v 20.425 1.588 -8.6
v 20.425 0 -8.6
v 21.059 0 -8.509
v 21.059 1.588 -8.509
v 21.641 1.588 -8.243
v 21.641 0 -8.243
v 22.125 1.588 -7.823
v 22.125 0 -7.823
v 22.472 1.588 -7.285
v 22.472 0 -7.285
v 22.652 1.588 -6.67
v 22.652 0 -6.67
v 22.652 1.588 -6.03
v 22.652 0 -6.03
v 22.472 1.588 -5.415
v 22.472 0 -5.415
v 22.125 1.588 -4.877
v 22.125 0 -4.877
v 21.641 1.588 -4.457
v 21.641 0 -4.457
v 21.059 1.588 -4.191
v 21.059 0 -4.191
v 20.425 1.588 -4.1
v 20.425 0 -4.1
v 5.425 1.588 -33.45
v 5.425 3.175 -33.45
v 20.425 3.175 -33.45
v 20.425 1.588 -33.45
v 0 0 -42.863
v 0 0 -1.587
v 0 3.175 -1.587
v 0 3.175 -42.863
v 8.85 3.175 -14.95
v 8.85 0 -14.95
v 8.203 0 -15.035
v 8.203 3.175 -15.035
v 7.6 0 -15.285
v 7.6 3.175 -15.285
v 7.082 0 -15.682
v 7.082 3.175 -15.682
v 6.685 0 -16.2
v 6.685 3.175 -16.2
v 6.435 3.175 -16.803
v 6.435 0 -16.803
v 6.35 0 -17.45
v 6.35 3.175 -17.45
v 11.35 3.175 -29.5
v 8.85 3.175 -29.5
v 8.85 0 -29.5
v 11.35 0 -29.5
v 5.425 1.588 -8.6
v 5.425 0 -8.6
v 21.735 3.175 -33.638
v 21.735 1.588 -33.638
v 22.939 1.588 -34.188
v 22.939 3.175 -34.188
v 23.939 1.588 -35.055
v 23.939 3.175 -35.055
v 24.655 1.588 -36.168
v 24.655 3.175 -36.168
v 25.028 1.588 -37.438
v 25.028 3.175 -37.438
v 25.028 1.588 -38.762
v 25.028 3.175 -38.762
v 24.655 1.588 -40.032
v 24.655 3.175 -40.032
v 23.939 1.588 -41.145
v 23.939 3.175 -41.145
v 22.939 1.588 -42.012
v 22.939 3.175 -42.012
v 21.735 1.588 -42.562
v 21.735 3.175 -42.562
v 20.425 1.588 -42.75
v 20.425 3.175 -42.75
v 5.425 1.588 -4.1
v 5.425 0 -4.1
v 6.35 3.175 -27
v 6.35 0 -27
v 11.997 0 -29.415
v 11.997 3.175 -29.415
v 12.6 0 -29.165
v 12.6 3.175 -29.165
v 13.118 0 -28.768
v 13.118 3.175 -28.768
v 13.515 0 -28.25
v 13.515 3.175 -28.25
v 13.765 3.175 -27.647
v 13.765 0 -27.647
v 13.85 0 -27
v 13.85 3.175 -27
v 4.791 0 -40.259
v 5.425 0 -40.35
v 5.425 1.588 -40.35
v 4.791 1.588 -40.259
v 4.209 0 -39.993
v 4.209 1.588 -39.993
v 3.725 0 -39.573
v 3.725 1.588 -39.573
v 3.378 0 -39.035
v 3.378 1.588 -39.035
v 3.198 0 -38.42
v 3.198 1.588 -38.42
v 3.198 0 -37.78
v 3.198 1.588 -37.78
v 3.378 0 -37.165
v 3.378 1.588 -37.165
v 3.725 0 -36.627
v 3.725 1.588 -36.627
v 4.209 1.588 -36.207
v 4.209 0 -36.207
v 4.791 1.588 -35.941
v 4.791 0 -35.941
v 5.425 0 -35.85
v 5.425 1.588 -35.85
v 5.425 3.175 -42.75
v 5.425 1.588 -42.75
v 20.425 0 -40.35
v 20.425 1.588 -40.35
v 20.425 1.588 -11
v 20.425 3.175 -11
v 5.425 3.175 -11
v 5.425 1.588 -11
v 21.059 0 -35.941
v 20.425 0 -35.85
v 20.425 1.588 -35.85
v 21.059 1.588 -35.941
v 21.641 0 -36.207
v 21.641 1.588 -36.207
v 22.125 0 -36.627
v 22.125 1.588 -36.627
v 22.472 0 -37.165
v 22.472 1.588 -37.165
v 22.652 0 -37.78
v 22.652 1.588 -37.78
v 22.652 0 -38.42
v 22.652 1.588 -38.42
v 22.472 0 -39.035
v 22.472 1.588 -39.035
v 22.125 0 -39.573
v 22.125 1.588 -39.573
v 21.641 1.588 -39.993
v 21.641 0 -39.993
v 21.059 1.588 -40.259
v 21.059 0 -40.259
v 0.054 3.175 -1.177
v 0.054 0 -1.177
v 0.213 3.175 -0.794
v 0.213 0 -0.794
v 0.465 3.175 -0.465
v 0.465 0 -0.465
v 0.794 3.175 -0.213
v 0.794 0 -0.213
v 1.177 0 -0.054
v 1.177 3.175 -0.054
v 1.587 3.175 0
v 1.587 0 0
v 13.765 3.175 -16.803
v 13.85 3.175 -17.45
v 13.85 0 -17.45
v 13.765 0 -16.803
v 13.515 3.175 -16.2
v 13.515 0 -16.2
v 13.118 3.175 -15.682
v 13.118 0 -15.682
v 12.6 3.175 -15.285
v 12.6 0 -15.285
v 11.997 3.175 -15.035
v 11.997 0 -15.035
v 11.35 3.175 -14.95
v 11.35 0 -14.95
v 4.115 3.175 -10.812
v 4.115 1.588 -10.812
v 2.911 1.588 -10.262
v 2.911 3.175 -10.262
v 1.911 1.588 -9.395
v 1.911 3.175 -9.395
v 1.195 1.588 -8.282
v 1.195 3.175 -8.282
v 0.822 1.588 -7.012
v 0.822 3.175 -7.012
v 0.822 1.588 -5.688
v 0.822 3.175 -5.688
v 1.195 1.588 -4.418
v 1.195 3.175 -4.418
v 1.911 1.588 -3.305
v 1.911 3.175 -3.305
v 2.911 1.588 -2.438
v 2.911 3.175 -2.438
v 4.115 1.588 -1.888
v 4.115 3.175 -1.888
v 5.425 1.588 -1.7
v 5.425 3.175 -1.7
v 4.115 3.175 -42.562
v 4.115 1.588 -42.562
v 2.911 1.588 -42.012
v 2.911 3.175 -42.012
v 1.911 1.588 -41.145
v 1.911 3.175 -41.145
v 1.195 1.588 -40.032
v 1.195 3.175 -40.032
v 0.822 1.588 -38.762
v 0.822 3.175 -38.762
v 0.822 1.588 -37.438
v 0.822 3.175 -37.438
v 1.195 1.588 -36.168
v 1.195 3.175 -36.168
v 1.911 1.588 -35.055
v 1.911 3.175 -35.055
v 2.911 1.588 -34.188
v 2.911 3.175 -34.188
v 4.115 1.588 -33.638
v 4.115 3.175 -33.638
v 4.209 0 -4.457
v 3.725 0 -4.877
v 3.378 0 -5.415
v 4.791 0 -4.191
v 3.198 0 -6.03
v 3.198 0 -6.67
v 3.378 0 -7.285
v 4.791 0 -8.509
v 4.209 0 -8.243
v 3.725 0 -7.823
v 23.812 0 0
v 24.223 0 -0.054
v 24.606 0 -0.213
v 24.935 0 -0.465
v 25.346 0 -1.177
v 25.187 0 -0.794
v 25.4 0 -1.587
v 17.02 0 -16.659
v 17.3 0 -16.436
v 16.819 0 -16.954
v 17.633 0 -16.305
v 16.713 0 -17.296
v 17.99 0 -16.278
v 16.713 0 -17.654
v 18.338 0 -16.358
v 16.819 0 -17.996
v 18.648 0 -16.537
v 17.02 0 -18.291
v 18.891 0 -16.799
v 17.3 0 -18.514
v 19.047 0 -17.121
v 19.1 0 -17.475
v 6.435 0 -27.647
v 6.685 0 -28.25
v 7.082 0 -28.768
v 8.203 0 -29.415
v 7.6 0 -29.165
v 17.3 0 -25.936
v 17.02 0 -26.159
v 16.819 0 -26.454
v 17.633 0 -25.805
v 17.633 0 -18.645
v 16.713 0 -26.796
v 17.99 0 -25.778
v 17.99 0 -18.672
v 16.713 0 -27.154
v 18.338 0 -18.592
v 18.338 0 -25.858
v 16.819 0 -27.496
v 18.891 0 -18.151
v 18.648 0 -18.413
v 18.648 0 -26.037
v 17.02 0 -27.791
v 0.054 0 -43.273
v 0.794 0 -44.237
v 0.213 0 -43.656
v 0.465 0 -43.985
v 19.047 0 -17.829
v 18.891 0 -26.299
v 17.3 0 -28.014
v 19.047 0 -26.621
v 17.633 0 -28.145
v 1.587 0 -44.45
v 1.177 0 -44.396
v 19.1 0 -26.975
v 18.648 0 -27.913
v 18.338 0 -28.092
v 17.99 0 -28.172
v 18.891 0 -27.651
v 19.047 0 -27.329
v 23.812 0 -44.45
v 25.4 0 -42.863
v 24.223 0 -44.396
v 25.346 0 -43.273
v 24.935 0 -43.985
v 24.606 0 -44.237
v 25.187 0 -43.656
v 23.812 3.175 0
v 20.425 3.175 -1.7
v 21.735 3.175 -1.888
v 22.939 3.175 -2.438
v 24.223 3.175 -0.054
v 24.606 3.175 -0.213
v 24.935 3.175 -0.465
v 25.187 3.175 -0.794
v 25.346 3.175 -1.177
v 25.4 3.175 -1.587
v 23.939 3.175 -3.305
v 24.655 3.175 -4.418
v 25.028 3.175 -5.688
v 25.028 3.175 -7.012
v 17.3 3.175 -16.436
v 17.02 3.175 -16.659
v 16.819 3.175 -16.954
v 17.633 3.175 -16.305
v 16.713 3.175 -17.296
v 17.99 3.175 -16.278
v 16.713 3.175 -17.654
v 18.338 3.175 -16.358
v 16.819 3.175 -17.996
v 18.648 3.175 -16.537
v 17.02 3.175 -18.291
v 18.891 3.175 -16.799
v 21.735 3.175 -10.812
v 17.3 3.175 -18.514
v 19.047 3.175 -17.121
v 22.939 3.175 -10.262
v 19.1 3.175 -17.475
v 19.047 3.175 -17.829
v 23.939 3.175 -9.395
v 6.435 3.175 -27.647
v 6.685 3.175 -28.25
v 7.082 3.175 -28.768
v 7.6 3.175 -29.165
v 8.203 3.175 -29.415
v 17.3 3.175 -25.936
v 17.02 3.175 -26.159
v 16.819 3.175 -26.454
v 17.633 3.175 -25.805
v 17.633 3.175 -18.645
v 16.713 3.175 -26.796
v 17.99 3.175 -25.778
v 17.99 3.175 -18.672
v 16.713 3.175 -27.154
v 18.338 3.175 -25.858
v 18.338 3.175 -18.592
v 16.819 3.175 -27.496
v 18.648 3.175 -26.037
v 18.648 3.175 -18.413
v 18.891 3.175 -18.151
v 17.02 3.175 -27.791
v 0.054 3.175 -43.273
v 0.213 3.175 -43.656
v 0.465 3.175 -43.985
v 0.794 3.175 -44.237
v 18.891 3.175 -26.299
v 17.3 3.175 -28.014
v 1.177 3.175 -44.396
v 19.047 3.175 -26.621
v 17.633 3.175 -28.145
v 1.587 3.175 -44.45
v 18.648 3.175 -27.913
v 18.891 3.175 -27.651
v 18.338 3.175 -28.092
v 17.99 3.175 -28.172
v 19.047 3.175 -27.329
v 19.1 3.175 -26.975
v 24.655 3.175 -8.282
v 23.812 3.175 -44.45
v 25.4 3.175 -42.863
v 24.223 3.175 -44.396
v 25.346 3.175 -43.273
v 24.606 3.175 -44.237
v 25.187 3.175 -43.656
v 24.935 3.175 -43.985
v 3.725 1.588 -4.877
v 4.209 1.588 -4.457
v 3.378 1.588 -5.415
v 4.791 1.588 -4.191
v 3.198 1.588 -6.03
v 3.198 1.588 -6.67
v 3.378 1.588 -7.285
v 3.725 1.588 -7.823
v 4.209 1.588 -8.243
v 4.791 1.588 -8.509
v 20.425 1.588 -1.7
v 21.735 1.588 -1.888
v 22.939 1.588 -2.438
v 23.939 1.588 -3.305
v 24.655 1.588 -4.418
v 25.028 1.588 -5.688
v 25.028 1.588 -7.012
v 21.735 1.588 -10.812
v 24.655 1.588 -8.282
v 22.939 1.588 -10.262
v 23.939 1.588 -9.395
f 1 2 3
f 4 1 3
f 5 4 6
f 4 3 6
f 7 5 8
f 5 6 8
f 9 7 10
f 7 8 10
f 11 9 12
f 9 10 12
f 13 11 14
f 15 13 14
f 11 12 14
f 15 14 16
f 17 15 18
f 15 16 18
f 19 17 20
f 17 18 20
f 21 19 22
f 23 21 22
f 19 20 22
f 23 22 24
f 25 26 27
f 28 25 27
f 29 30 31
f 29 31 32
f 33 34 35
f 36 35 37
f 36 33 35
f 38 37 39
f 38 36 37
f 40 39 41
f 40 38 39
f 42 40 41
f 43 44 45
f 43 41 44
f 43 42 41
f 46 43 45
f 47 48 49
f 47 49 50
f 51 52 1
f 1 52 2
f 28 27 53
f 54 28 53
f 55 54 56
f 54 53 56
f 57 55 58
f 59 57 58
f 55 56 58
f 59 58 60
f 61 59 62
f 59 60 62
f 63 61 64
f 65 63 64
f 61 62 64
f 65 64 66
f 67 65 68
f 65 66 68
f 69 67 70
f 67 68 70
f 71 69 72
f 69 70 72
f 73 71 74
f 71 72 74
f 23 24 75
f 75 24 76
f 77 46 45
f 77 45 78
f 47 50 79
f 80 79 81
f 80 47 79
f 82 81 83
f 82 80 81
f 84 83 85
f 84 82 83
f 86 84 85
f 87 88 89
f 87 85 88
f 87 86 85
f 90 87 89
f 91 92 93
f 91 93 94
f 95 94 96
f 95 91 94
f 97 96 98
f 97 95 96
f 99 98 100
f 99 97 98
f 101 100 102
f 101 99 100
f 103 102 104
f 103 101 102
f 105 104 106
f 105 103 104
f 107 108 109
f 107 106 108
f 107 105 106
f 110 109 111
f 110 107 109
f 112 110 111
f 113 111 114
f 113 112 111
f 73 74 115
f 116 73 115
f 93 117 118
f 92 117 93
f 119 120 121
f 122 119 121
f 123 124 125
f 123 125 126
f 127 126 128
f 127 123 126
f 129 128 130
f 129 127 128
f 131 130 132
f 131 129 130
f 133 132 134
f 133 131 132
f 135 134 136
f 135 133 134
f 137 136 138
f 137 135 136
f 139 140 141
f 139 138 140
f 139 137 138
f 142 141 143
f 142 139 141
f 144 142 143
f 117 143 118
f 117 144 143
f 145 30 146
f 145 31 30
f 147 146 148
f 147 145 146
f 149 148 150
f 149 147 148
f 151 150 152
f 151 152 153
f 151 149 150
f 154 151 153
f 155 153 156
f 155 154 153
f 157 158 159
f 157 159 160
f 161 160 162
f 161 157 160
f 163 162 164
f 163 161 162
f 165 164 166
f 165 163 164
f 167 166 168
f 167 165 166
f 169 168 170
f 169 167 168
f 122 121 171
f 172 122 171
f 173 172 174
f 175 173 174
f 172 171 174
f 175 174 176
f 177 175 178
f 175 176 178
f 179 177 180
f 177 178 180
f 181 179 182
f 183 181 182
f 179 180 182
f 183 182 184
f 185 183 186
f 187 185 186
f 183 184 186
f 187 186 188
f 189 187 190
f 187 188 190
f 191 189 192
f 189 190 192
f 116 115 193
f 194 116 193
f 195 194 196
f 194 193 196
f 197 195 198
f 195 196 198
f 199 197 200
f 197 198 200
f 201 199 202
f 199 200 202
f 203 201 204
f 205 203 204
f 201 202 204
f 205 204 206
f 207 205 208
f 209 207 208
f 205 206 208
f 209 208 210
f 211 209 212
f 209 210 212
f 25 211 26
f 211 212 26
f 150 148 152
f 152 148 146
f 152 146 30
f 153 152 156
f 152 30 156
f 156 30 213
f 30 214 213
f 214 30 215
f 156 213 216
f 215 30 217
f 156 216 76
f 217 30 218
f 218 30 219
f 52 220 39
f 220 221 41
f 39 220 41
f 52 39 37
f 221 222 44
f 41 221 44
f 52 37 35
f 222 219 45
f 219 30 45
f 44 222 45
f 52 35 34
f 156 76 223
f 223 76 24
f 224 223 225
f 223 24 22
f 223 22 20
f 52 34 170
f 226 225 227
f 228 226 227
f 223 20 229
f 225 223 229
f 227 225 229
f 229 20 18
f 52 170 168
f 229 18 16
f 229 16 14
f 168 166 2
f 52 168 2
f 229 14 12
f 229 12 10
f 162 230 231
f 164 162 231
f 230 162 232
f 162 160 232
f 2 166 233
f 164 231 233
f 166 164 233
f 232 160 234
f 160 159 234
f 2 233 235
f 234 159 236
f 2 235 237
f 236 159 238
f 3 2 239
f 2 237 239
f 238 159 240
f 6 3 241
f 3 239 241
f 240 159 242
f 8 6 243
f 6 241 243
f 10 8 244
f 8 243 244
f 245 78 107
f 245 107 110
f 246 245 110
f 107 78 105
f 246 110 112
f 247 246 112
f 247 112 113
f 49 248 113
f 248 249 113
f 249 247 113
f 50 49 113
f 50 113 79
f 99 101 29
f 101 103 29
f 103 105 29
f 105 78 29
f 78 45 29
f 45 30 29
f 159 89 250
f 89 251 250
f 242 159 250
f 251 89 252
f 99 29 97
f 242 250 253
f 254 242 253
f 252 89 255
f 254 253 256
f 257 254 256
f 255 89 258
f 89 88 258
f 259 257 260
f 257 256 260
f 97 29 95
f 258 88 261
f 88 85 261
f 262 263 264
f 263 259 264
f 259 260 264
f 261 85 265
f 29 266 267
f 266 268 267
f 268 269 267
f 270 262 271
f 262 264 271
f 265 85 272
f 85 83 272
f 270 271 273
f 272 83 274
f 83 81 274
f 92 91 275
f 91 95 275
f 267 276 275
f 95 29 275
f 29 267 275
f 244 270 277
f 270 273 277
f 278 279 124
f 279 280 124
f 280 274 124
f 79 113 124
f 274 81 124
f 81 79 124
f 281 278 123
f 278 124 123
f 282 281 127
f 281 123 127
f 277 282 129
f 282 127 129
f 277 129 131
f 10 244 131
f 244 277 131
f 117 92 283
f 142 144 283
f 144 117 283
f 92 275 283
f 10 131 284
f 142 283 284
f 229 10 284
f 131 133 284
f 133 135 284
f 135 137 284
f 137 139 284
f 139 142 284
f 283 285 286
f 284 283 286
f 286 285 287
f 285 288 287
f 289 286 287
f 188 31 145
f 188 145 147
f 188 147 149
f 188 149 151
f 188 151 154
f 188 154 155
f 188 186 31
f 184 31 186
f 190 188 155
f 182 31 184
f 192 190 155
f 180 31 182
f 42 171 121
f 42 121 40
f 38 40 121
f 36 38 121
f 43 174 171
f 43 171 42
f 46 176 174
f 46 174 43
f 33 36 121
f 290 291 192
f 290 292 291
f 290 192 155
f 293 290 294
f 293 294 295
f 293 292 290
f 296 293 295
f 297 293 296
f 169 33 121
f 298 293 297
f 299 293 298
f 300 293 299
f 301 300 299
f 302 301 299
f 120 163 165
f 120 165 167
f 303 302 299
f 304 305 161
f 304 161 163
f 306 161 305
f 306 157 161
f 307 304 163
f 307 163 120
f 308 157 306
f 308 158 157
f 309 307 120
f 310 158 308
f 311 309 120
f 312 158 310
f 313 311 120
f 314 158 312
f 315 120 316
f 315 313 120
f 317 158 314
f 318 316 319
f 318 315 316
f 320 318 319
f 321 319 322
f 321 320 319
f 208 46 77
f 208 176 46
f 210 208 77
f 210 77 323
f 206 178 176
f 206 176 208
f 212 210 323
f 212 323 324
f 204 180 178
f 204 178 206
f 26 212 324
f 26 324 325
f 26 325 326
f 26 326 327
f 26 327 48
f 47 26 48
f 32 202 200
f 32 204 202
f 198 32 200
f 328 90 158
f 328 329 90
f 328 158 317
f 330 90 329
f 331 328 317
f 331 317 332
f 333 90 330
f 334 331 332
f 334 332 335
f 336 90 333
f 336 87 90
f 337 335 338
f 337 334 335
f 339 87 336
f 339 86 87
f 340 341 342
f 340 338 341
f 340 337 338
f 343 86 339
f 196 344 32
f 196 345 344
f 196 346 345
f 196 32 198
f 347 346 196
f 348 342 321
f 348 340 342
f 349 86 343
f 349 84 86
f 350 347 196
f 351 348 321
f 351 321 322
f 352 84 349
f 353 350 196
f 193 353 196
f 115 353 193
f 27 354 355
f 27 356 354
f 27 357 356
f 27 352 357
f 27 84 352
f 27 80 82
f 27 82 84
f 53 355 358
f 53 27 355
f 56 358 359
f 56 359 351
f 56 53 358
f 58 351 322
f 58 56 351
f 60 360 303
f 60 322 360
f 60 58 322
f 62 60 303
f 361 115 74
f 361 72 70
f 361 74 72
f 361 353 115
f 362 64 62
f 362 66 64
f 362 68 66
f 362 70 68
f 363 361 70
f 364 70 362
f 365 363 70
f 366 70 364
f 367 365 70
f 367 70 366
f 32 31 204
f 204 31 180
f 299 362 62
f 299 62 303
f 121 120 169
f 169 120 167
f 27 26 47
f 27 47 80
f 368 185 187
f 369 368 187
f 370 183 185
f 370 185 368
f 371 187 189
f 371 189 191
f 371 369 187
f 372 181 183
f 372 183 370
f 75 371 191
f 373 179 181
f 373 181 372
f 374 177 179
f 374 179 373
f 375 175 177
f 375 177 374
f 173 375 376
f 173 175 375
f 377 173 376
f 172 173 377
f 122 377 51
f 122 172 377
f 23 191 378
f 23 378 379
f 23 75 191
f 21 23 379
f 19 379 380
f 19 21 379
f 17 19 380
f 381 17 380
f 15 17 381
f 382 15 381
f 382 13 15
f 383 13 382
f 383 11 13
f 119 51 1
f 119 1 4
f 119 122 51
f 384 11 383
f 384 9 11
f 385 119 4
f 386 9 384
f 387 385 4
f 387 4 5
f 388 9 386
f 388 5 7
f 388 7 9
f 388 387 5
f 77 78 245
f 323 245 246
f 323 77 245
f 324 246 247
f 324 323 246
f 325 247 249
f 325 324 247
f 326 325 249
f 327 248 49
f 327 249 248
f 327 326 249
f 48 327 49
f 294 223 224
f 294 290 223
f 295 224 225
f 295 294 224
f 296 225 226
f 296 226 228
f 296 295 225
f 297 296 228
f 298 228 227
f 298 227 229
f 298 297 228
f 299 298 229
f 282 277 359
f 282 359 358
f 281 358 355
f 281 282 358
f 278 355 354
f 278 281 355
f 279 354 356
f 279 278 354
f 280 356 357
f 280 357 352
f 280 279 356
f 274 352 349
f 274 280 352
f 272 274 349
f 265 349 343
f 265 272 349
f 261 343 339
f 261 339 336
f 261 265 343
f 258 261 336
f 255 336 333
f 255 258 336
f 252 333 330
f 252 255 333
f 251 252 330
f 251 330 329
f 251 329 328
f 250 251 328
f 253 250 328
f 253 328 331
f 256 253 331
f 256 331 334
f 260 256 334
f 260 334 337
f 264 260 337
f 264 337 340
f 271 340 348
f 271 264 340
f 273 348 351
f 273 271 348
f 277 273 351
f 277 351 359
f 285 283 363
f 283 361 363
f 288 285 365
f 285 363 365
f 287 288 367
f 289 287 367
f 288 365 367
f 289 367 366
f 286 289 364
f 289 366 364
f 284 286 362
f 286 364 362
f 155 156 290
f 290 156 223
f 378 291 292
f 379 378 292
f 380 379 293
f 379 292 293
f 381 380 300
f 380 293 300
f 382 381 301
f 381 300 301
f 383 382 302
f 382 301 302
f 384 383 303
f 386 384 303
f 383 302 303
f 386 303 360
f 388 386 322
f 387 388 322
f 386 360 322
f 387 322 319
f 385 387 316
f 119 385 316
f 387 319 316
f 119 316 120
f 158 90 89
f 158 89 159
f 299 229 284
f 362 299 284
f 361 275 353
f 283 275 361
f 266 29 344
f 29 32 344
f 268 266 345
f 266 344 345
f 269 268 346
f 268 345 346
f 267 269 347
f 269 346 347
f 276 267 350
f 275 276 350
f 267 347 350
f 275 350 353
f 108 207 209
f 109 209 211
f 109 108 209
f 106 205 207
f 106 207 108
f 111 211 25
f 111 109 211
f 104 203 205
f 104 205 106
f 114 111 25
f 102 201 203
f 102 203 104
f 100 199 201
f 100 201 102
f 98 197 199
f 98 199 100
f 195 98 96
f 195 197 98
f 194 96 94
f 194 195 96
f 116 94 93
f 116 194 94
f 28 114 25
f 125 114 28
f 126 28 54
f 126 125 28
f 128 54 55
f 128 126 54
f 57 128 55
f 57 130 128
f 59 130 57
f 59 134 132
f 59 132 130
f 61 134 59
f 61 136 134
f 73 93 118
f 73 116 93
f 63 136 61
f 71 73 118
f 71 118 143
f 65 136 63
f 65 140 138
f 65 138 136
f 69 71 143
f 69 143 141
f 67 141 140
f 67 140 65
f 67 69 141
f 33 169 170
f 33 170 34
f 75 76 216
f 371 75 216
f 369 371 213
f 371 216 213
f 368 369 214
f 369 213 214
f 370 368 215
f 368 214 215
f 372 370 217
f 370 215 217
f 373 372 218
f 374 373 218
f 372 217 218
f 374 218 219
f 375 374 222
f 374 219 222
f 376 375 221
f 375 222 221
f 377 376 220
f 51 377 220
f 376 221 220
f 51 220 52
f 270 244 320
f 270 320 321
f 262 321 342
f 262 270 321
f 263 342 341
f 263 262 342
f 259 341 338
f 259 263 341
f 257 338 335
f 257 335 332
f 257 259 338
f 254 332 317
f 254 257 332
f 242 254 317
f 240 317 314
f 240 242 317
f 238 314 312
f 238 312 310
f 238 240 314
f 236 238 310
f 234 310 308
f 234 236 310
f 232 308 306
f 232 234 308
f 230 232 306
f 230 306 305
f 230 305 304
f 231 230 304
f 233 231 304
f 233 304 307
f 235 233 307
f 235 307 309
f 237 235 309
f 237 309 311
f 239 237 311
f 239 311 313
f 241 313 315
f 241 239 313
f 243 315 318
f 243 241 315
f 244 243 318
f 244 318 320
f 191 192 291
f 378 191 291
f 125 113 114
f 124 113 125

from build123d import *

# Parameters (mm, degrees)
SKETCH1_W           = 25.4
SKETCH1_H           = 44.45
SKETCH1_R           = 1.2
BOSS_EXTRUDE1_DEPTH = 3.175
CUT_EXTRUDE1_DEPTH  = 4.175
FILLET1_R           = 1.5875
CUT_EXTRUDE2_DEPTH  = 1.5875


with BuildPart() as part:
    # Sketch1 → Boss-Extrude1 (new body)
    with BuildSketch(Plane(origin=(0, 0, 0), x_dir=(1, 0, 0), z_dir=(0, 1, 0))):
        with Locations((12.7, 22.225)):
            Rectangle(SKETCH1_W, SKETCH1_H)
        with Locations((17.9, 17.475)):
            Circle(SKETCH1_R, mode=Mode.SUBTRACT)
        with Locations((17.9, 26.975)):
            Circle(SKETCH1_R, mode=Mode.SUBTRACT)
        with BuildLine():
            Line((5.425, 8.6), (20.425, 8.6))
            ThreePointArc((20.425, 8.6), (22.675, 6.35), (20.425, 4.1))
            Line((20.425, 4.1), (5.425, 4.1))
            ThreePointArc((5.425, 4.1), (3.175, 6.35), (5.425, 8.6))
        make_face(mode=Mode.SUBTRACT)
        with BuildLine():
            Line((5.425, 35.85), (20.425, 35.85))
            ThreePointArc((20.425, 35.85), (22.675, 38.1), (20.425, 40.35))
            Line((20.425, 40.35), (5.425, 40.35))
            ThreePointArc((5.425, 40.35), (3.175, 38.1), (5.425, 35.85))
        make_face(mode=Mode.SUBTRACT)
    extrude(amount=BOSS_EXTRUDE1_DEPTH)

    # Sketch2 → Cut-Extrude1 (cut, through all)
    with BuildSketch(Plane(origin=(0, 3.175, 0), x_dir=(1, 0, 0), z_dir=(0, 1, 0))):
        with BuildLine():
            Line((11.35, 14.95), (8.85, 14.95))
            ThreePointArc((8.85, 14.95), (7.082233047, 15.682233047), (6.35, 17.45))
            Line((6.35, 17.45), (6.35, 27))
            ThreePointArc((6.35, 27), (7.082233047, 28.767766953), (8.85, 29.5))
            Line((8.85, 29.5), (11.35, 29.5))
            ThreePointArc((11.35, 29.5), (13.117766953, 28.767766953), (13.85, 27))
            Line((13.85, 27), (13.85, 17.45))
            ThreePointArc((13.85, 17.45), (13.117766953, 15.682233047), (11.35, 14.95))
        make_face()
    extrude(amount=-CUT_EXTRUDE1_DEPTH, mode=Mode.SUBTRACT)

    # Fillet1
    fillet1_edges = [part.edges().sort_by_distance(p)[0] for p in [
        (0, 1.5875, -44.45),
        (25.4, 1.5875, -44.45),
        (25.4, 1.5875, 0),
        (0, 1.5875, 0),
    ]]
    fillet(fillet1_edges, radius=FILLET1_R)

    # Sketch3 → Cut-Extrude2 (cut)
    with BuildSketch(Plane(origin=(0, 3.175, 0), x_dir=(1, 0, 0), z_dir=(0, 1, 0))):
        with BuildLine():
            Line((5.425, 33.45), (20.425, 33.45))
            ThreePointArc((20.425, 33.45), (25.075, 38.1), (20.425, 42.75))
            Line((20.425, 42.75), (5.425, 42.75))
            ThreePointArc((5.425, 42.75), (0.775, 38.1), (5.425, 33.45))
        make_face()
        with BuildLine():
            Line((5.425, 1.7), (20.425, 1.7))
            ThreePointArc((20.425, 1.7), (25.075, 6.35), (20.425, 11))
            Line((20.425, 11), (5.425, 11))
            ThreePointArc((5.425, 11), (0.775, 6.35), (5.425, 1.7))
        make_face()
    extrude(amount=-CUT_EXTRUDE2_DEPTH, mode=Mode.SUBTRACT)


solid = part.part
